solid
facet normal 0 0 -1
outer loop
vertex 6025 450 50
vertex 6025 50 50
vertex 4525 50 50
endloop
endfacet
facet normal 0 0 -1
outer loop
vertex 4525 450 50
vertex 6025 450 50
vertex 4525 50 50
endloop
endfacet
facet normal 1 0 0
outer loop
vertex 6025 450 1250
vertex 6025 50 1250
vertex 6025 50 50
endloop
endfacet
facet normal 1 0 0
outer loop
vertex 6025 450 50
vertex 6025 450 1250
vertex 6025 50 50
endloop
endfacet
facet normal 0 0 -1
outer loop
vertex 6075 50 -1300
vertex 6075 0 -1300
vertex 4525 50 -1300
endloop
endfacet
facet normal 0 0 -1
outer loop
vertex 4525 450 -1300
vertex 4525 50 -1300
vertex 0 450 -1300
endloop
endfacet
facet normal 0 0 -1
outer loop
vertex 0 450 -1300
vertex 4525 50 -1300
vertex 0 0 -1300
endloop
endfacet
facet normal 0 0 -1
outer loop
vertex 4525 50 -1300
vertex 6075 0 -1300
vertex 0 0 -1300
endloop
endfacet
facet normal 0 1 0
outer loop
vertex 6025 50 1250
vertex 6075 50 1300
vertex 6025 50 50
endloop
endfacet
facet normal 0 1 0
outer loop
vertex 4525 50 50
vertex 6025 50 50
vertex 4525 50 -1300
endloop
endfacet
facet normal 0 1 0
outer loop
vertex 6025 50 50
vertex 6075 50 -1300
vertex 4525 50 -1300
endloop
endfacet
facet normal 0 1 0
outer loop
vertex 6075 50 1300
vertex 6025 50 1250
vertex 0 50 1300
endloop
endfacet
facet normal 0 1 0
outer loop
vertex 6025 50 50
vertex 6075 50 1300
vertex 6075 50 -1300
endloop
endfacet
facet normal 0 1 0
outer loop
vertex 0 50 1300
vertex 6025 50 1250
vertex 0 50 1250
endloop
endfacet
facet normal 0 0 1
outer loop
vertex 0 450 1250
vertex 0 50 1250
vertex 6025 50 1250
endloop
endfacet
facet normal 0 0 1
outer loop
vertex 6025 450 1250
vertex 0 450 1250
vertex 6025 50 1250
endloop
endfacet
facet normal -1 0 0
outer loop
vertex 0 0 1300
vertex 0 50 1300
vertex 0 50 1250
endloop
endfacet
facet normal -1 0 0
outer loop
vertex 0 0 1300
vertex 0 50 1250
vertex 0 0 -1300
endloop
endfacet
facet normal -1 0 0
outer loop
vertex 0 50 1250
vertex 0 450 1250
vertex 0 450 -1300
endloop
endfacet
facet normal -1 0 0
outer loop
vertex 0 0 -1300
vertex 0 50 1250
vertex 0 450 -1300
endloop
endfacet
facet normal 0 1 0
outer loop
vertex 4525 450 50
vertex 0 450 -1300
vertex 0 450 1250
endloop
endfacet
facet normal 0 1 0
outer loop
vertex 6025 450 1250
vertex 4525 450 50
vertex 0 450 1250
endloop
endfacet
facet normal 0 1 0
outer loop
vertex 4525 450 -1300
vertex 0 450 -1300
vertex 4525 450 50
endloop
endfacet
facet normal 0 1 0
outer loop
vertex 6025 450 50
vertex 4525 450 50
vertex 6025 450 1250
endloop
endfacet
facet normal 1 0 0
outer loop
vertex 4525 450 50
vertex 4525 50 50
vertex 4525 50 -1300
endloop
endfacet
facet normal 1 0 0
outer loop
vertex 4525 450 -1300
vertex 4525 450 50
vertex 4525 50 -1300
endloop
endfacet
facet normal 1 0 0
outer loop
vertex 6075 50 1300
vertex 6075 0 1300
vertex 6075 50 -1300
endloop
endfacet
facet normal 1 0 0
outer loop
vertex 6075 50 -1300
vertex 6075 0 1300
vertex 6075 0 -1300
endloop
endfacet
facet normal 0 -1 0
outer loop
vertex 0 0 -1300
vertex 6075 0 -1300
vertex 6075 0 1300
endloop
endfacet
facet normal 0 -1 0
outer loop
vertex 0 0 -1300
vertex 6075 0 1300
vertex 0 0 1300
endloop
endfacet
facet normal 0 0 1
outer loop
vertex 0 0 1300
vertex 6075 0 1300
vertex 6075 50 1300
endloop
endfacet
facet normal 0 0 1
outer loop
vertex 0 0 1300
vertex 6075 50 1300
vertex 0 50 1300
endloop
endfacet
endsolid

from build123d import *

# Parameters (mm, degrees)
SKETCH_1_W          = 6075
SKETCH_1_H          = 2600
EXTRUDE_1_DEPTH     = 50
EXTRUDE_2_DEPTH     = 400
SKETCH_3_W          = 6075
SKETCH_3_H          = 2600
CUT_EXTRUDE_1_DEPTH = 6229.814092586


with BuildPart() as part:
    # 草图1 → 凸台-拉伸1 (new body)
    with BuildSketch(Plane(origin=(0, 0, 0), x_dir=(1, 0, 0), z_dir=(0, 1, 0))):
        with Locations((-3037.5, 0)):
            Rectangle(SKETCH_1_W, SKETCH_1_H)
    extrude(amount=EXTRUDE_1_DEPTH)

    # 草图2 → 凸台-拉伸2 (add)
    with BuildSketch(Plane(origin=(0, 50, 0), x_dir=(1, 0, 0), z_dir=(0, 1, 0))):
        Polygon((0, 1300), (0, -1250), (-6025, -1250), (-6025, -50), (-4525, -50), (-4525, 1300), align=None)
    extrude(amount=EXTRUDE_2_DEPTH)

    # 镜向1: part across plane


with BuildPart() as part_1:
    add(part.part)
    add(part.part.mirror(Plane(origin=(0, 50, 1300), x_dir=(0, 0, 1), z_dir=(-1, 0, 0))))

    # 草图3 → 切除-拉伸1 (cut, through all)
    with BuildSketch(Plane(origin=(0, 450, 0), x_dir=(1, 0, 0), z_dir=(0, 1, 0))):
        with Locations((-3037.5, 0)):
            Rectangle(SKETCH_3_W, SKETCH_3_H)
    extrude(amount=-CUT_EXTRUDE_1_DEPTH, mode=Mode.SUBTRACT)


solid = part_1.part
